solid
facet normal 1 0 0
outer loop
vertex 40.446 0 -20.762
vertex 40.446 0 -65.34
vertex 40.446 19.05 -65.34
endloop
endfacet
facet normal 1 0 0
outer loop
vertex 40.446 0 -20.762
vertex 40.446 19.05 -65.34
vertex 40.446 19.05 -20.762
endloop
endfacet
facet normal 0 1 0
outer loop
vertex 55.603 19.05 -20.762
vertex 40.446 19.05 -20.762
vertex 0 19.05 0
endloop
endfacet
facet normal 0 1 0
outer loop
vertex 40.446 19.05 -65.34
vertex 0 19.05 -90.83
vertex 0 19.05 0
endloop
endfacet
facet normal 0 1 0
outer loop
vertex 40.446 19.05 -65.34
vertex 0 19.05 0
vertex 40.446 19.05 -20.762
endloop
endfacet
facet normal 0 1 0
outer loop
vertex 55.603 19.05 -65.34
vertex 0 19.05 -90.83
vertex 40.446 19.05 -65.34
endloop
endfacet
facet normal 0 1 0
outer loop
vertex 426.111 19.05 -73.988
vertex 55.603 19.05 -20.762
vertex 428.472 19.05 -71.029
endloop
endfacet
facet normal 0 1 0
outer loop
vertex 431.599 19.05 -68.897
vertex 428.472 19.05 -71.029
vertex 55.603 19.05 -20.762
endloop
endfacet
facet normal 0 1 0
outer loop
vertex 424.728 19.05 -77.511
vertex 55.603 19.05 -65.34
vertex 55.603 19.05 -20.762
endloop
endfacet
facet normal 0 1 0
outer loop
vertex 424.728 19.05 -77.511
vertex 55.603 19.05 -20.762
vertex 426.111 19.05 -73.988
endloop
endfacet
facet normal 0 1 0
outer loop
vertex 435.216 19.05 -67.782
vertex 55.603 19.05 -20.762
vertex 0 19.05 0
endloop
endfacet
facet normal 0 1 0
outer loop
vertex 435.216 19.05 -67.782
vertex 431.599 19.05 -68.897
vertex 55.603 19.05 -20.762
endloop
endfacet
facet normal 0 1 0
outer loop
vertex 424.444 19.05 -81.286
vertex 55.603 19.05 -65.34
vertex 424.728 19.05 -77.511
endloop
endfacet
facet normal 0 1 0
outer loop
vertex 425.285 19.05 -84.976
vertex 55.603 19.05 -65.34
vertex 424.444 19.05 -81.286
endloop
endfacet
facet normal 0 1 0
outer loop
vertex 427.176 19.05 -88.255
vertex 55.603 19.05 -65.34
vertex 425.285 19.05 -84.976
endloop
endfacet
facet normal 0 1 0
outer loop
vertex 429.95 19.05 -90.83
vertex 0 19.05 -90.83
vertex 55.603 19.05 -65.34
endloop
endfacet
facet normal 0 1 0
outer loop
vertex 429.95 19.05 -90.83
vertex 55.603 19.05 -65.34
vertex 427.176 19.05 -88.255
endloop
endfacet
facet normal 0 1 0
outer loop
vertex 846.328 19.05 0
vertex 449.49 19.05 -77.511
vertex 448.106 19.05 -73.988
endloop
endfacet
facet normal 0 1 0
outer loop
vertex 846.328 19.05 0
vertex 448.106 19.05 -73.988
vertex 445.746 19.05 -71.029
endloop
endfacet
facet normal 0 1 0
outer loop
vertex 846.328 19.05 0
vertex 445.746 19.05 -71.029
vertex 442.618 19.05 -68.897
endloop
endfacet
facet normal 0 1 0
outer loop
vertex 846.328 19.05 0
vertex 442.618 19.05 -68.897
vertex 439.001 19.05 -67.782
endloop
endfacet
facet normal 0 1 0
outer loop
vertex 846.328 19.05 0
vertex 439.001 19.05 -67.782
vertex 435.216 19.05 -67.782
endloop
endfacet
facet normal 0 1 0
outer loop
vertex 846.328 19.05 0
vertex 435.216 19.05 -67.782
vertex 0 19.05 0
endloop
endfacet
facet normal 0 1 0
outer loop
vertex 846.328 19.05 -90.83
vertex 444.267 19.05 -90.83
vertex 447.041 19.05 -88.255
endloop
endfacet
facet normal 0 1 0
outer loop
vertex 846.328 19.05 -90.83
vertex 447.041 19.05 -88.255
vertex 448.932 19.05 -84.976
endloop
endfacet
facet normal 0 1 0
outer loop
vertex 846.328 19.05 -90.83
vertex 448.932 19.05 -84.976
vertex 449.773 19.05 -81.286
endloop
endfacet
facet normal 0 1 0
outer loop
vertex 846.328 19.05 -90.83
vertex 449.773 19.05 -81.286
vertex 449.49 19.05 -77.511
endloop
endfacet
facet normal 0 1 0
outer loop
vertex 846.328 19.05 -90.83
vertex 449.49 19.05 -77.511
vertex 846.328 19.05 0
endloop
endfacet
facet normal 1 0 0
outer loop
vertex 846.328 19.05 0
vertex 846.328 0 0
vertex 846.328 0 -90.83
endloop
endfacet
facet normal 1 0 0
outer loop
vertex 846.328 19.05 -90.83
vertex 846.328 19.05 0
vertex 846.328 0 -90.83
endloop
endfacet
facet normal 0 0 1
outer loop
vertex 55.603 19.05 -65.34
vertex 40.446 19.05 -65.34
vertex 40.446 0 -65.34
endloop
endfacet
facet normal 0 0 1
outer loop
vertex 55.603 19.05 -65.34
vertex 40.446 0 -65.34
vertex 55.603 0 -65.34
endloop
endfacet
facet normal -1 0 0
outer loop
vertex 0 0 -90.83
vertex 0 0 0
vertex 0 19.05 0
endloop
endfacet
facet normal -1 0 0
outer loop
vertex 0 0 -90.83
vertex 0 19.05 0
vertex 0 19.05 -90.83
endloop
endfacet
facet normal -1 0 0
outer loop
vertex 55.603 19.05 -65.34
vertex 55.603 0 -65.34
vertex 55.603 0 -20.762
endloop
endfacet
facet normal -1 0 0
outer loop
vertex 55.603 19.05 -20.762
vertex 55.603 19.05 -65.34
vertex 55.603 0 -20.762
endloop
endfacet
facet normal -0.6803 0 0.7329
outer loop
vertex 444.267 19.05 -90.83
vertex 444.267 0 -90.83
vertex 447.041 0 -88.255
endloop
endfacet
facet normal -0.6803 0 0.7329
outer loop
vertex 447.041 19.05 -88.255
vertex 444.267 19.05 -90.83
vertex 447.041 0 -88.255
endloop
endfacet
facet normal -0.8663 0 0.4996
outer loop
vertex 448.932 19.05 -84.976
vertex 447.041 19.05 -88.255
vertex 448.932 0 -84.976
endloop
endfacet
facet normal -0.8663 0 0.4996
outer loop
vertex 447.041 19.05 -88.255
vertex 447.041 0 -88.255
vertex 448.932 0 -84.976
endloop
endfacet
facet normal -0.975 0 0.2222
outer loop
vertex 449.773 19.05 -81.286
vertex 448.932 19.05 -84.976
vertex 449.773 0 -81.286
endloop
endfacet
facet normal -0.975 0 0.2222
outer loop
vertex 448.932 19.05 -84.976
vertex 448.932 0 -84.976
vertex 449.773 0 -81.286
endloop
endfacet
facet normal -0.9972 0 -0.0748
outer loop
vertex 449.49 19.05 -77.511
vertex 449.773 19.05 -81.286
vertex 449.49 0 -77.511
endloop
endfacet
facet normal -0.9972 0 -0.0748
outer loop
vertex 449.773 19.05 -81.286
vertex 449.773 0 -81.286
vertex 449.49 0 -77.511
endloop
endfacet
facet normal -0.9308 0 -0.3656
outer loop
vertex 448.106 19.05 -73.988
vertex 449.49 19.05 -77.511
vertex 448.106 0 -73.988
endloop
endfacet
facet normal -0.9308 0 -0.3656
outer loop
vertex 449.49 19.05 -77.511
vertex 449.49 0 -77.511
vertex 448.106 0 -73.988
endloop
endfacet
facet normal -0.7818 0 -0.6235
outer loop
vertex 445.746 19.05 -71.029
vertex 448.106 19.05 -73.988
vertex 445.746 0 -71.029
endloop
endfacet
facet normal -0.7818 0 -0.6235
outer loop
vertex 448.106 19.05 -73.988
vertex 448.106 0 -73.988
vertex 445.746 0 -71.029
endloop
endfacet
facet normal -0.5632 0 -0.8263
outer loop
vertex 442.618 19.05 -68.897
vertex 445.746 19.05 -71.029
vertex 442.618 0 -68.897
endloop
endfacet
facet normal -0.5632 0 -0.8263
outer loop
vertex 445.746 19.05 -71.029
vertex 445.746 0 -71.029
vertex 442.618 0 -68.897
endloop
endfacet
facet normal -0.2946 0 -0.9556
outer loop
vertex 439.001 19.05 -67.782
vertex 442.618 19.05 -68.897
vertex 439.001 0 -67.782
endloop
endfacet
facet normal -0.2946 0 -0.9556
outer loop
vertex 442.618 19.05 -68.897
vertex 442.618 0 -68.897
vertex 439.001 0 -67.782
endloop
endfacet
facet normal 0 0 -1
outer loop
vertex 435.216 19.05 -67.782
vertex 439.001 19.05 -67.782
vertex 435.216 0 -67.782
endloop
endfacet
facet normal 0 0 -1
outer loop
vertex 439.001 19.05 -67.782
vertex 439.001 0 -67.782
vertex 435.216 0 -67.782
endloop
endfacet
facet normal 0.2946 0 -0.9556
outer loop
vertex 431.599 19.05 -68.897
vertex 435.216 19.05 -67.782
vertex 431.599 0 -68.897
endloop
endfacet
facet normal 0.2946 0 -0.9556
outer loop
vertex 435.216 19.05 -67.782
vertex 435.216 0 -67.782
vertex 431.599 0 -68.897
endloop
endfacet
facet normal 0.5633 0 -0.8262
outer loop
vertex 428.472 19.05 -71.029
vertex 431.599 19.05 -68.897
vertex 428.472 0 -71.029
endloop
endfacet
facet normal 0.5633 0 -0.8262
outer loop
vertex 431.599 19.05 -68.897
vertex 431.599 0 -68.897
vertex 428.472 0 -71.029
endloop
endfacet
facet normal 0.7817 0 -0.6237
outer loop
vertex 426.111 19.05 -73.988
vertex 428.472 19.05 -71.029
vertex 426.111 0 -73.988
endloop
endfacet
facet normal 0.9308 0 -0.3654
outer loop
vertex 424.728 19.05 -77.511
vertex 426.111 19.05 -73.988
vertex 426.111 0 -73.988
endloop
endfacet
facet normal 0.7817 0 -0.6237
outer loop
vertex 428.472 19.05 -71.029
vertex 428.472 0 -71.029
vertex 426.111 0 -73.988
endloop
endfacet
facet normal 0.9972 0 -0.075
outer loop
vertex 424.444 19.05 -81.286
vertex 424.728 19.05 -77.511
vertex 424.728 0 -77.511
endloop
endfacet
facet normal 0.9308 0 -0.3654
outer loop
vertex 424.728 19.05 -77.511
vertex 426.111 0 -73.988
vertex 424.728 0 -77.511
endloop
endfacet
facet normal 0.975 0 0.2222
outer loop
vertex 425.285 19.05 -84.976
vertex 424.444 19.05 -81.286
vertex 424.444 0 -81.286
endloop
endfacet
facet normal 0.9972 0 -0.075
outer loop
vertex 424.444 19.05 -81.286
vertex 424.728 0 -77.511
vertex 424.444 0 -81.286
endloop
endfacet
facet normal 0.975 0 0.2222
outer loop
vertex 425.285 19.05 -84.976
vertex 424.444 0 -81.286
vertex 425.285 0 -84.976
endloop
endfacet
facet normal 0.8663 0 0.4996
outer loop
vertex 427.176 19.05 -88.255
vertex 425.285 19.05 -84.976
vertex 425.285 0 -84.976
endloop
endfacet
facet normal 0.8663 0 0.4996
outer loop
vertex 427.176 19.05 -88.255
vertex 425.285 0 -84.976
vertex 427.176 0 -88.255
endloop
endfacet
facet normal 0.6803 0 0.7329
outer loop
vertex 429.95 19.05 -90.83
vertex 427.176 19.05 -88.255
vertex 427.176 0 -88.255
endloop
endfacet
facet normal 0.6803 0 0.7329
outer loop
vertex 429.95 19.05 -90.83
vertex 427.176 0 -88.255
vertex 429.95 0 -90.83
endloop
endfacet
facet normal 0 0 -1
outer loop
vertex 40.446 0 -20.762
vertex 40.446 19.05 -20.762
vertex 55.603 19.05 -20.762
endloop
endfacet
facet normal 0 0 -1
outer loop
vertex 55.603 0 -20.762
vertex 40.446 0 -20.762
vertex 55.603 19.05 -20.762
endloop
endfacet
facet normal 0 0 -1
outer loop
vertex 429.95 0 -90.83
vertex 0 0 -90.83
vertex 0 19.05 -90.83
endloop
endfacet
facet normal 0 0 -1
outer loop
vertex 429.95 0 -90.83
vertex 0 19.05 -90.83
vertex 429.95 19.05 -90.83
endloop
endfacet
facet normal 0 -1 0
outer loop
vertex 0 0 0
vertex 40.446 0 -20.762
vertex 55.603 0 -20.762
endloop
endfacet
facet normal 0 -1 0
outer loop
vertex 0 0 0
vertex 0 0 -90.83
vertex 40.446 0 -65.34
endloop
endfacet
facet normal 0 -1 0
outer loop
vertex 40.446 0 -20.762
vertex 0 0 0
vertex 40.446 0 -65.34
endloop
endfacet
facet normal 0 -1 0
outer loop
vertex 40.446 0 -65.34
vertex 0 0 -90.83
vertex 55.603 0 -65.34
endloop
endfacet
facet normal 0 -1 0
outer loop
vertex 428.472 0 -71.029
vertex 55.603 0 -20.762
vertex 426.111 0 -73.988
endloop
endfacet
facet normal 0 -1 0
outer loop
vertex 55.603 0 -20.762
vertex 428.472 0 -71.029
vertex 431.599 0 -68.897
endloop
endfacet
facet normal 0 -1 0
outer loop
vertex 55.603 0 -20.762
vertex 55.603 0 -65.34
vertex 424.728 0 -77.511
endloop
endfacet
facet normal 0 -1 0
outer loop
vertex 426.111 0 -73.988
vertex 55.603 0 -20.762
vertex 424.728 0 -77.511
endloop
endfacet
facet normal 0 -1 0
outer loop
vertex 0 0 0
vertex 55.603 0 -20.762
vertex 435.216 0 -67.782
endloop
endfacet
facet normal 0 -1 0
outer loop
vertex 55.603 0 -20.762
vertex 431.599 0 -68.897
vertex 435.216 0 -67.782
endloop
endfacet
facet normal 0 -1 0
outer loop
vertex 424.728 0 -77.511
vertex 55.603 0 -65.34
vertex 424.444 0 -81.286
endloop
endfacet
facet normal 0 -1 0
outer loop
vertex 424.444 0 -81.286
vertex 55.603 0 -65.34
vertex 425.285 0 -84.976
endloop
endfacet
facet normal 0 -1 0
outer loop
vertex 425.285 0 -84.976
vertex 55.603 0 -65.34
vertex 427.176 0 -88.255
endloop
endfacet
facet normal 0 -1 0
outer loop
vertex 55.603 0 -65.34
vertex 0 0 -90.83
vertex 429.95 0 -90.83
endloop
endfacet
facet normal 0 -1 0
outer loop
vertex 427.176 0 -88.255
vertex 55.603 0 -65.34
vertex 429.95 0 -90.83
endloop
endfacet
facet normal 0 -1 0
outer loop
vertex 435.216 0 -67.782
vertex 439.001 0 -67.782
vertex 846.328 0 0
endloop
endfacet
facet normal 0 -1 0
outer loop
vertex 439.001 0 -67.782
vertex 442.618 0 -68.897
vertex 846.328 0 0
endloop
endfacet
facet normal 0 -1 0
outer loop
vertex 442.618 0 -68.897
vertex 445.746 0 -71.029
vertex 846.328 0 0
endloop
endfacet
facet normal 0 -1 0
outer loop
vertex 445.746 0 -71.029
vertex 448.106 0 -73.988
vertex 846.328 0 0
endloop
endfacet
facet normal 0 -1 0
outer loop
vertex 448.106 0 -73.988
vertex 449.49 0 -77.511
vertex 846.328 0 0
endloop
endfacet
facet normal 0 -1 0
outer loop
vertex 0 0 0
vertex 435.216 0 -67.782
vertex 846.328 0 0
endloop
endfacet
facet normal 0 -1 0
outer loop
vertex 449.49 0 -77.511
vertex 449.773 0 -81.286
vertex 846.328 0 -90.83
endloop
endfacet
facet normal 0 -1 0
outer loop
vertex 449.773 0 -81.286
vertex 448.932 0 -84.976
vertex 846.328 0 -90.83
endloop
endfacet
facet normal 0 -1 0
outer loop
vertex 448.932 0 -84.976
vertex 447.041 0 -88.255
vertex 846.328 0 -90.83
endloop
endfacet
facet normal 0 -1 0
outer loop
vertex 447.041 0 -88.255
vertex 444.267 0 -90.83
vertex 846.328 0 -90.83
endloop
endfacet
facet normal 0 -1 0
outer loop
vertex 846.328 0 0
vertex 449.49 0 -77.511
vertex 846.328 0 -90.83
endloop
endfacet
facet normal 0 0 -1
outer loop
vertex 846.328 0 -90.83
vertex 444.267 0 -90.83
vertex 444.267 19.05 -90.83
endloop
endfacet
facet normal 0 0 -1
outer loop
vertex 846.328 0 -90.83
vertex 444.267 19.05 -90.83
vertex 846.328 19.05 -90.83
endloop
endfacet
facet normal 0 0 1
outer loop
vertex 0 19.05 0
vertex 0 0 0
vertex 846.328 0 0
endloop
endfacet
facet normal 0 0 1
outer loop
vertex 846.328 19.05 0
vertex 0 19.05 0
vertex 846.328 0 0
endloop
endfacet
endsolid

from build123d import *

# Parameters (mm, degrees)
SKETCH1_W           = 846.328
SKETCH1_H           = 90.8304
BOSS_EXTRUDE1_DEPTH = 19.05
SKETCH2_R           = 12.7
CUT_EXTRUDE4_DEPTH  = 20.05
SKETCH4_W           = 15.156731747
SKETCH4_H           = 44.578622786
CUT_EXTRUDE5_DEPTH  = 20.05


with BuildPart() as part:
    # Sketch1 → Boss-Extrude1 (new body)
    with BuildSketch(Plane(origin=(0, 0, 0), x_dir=(1, 0, 0), z_dir=(0, 1, 0))):
        with Locations((423.164, 45.4152)):
            Rectangle(SKETCH1_W, SKETCH1_H)
    extrude(amount=BOSS_EXTRUDE1_DEPTH)

    # Sketch2 → Cut-Extrude4 (cut, through all)
    with BuildSketch(Plane.XZ):
        with Locations((437.1086, -80.3402)):
            Circle(SKETCH2_R)
    extrude(amount=-CUT_EXTRUDE4_DEPTH, mode=Mode.SUBTRACT)

    # Sketch4 → Cut-Extrude5 (cut, through all)
    with BuildSketch(Plane.XZ):
        with Locations((48.024327766, -43.050866134)):
            Rectangle(SKETCH4_W, SKETCH4_H)
    extrude(amount=-CUT_EXTRUDE5_DEPTH, mode=Mode.SUBTRACT)


solid = part.part
